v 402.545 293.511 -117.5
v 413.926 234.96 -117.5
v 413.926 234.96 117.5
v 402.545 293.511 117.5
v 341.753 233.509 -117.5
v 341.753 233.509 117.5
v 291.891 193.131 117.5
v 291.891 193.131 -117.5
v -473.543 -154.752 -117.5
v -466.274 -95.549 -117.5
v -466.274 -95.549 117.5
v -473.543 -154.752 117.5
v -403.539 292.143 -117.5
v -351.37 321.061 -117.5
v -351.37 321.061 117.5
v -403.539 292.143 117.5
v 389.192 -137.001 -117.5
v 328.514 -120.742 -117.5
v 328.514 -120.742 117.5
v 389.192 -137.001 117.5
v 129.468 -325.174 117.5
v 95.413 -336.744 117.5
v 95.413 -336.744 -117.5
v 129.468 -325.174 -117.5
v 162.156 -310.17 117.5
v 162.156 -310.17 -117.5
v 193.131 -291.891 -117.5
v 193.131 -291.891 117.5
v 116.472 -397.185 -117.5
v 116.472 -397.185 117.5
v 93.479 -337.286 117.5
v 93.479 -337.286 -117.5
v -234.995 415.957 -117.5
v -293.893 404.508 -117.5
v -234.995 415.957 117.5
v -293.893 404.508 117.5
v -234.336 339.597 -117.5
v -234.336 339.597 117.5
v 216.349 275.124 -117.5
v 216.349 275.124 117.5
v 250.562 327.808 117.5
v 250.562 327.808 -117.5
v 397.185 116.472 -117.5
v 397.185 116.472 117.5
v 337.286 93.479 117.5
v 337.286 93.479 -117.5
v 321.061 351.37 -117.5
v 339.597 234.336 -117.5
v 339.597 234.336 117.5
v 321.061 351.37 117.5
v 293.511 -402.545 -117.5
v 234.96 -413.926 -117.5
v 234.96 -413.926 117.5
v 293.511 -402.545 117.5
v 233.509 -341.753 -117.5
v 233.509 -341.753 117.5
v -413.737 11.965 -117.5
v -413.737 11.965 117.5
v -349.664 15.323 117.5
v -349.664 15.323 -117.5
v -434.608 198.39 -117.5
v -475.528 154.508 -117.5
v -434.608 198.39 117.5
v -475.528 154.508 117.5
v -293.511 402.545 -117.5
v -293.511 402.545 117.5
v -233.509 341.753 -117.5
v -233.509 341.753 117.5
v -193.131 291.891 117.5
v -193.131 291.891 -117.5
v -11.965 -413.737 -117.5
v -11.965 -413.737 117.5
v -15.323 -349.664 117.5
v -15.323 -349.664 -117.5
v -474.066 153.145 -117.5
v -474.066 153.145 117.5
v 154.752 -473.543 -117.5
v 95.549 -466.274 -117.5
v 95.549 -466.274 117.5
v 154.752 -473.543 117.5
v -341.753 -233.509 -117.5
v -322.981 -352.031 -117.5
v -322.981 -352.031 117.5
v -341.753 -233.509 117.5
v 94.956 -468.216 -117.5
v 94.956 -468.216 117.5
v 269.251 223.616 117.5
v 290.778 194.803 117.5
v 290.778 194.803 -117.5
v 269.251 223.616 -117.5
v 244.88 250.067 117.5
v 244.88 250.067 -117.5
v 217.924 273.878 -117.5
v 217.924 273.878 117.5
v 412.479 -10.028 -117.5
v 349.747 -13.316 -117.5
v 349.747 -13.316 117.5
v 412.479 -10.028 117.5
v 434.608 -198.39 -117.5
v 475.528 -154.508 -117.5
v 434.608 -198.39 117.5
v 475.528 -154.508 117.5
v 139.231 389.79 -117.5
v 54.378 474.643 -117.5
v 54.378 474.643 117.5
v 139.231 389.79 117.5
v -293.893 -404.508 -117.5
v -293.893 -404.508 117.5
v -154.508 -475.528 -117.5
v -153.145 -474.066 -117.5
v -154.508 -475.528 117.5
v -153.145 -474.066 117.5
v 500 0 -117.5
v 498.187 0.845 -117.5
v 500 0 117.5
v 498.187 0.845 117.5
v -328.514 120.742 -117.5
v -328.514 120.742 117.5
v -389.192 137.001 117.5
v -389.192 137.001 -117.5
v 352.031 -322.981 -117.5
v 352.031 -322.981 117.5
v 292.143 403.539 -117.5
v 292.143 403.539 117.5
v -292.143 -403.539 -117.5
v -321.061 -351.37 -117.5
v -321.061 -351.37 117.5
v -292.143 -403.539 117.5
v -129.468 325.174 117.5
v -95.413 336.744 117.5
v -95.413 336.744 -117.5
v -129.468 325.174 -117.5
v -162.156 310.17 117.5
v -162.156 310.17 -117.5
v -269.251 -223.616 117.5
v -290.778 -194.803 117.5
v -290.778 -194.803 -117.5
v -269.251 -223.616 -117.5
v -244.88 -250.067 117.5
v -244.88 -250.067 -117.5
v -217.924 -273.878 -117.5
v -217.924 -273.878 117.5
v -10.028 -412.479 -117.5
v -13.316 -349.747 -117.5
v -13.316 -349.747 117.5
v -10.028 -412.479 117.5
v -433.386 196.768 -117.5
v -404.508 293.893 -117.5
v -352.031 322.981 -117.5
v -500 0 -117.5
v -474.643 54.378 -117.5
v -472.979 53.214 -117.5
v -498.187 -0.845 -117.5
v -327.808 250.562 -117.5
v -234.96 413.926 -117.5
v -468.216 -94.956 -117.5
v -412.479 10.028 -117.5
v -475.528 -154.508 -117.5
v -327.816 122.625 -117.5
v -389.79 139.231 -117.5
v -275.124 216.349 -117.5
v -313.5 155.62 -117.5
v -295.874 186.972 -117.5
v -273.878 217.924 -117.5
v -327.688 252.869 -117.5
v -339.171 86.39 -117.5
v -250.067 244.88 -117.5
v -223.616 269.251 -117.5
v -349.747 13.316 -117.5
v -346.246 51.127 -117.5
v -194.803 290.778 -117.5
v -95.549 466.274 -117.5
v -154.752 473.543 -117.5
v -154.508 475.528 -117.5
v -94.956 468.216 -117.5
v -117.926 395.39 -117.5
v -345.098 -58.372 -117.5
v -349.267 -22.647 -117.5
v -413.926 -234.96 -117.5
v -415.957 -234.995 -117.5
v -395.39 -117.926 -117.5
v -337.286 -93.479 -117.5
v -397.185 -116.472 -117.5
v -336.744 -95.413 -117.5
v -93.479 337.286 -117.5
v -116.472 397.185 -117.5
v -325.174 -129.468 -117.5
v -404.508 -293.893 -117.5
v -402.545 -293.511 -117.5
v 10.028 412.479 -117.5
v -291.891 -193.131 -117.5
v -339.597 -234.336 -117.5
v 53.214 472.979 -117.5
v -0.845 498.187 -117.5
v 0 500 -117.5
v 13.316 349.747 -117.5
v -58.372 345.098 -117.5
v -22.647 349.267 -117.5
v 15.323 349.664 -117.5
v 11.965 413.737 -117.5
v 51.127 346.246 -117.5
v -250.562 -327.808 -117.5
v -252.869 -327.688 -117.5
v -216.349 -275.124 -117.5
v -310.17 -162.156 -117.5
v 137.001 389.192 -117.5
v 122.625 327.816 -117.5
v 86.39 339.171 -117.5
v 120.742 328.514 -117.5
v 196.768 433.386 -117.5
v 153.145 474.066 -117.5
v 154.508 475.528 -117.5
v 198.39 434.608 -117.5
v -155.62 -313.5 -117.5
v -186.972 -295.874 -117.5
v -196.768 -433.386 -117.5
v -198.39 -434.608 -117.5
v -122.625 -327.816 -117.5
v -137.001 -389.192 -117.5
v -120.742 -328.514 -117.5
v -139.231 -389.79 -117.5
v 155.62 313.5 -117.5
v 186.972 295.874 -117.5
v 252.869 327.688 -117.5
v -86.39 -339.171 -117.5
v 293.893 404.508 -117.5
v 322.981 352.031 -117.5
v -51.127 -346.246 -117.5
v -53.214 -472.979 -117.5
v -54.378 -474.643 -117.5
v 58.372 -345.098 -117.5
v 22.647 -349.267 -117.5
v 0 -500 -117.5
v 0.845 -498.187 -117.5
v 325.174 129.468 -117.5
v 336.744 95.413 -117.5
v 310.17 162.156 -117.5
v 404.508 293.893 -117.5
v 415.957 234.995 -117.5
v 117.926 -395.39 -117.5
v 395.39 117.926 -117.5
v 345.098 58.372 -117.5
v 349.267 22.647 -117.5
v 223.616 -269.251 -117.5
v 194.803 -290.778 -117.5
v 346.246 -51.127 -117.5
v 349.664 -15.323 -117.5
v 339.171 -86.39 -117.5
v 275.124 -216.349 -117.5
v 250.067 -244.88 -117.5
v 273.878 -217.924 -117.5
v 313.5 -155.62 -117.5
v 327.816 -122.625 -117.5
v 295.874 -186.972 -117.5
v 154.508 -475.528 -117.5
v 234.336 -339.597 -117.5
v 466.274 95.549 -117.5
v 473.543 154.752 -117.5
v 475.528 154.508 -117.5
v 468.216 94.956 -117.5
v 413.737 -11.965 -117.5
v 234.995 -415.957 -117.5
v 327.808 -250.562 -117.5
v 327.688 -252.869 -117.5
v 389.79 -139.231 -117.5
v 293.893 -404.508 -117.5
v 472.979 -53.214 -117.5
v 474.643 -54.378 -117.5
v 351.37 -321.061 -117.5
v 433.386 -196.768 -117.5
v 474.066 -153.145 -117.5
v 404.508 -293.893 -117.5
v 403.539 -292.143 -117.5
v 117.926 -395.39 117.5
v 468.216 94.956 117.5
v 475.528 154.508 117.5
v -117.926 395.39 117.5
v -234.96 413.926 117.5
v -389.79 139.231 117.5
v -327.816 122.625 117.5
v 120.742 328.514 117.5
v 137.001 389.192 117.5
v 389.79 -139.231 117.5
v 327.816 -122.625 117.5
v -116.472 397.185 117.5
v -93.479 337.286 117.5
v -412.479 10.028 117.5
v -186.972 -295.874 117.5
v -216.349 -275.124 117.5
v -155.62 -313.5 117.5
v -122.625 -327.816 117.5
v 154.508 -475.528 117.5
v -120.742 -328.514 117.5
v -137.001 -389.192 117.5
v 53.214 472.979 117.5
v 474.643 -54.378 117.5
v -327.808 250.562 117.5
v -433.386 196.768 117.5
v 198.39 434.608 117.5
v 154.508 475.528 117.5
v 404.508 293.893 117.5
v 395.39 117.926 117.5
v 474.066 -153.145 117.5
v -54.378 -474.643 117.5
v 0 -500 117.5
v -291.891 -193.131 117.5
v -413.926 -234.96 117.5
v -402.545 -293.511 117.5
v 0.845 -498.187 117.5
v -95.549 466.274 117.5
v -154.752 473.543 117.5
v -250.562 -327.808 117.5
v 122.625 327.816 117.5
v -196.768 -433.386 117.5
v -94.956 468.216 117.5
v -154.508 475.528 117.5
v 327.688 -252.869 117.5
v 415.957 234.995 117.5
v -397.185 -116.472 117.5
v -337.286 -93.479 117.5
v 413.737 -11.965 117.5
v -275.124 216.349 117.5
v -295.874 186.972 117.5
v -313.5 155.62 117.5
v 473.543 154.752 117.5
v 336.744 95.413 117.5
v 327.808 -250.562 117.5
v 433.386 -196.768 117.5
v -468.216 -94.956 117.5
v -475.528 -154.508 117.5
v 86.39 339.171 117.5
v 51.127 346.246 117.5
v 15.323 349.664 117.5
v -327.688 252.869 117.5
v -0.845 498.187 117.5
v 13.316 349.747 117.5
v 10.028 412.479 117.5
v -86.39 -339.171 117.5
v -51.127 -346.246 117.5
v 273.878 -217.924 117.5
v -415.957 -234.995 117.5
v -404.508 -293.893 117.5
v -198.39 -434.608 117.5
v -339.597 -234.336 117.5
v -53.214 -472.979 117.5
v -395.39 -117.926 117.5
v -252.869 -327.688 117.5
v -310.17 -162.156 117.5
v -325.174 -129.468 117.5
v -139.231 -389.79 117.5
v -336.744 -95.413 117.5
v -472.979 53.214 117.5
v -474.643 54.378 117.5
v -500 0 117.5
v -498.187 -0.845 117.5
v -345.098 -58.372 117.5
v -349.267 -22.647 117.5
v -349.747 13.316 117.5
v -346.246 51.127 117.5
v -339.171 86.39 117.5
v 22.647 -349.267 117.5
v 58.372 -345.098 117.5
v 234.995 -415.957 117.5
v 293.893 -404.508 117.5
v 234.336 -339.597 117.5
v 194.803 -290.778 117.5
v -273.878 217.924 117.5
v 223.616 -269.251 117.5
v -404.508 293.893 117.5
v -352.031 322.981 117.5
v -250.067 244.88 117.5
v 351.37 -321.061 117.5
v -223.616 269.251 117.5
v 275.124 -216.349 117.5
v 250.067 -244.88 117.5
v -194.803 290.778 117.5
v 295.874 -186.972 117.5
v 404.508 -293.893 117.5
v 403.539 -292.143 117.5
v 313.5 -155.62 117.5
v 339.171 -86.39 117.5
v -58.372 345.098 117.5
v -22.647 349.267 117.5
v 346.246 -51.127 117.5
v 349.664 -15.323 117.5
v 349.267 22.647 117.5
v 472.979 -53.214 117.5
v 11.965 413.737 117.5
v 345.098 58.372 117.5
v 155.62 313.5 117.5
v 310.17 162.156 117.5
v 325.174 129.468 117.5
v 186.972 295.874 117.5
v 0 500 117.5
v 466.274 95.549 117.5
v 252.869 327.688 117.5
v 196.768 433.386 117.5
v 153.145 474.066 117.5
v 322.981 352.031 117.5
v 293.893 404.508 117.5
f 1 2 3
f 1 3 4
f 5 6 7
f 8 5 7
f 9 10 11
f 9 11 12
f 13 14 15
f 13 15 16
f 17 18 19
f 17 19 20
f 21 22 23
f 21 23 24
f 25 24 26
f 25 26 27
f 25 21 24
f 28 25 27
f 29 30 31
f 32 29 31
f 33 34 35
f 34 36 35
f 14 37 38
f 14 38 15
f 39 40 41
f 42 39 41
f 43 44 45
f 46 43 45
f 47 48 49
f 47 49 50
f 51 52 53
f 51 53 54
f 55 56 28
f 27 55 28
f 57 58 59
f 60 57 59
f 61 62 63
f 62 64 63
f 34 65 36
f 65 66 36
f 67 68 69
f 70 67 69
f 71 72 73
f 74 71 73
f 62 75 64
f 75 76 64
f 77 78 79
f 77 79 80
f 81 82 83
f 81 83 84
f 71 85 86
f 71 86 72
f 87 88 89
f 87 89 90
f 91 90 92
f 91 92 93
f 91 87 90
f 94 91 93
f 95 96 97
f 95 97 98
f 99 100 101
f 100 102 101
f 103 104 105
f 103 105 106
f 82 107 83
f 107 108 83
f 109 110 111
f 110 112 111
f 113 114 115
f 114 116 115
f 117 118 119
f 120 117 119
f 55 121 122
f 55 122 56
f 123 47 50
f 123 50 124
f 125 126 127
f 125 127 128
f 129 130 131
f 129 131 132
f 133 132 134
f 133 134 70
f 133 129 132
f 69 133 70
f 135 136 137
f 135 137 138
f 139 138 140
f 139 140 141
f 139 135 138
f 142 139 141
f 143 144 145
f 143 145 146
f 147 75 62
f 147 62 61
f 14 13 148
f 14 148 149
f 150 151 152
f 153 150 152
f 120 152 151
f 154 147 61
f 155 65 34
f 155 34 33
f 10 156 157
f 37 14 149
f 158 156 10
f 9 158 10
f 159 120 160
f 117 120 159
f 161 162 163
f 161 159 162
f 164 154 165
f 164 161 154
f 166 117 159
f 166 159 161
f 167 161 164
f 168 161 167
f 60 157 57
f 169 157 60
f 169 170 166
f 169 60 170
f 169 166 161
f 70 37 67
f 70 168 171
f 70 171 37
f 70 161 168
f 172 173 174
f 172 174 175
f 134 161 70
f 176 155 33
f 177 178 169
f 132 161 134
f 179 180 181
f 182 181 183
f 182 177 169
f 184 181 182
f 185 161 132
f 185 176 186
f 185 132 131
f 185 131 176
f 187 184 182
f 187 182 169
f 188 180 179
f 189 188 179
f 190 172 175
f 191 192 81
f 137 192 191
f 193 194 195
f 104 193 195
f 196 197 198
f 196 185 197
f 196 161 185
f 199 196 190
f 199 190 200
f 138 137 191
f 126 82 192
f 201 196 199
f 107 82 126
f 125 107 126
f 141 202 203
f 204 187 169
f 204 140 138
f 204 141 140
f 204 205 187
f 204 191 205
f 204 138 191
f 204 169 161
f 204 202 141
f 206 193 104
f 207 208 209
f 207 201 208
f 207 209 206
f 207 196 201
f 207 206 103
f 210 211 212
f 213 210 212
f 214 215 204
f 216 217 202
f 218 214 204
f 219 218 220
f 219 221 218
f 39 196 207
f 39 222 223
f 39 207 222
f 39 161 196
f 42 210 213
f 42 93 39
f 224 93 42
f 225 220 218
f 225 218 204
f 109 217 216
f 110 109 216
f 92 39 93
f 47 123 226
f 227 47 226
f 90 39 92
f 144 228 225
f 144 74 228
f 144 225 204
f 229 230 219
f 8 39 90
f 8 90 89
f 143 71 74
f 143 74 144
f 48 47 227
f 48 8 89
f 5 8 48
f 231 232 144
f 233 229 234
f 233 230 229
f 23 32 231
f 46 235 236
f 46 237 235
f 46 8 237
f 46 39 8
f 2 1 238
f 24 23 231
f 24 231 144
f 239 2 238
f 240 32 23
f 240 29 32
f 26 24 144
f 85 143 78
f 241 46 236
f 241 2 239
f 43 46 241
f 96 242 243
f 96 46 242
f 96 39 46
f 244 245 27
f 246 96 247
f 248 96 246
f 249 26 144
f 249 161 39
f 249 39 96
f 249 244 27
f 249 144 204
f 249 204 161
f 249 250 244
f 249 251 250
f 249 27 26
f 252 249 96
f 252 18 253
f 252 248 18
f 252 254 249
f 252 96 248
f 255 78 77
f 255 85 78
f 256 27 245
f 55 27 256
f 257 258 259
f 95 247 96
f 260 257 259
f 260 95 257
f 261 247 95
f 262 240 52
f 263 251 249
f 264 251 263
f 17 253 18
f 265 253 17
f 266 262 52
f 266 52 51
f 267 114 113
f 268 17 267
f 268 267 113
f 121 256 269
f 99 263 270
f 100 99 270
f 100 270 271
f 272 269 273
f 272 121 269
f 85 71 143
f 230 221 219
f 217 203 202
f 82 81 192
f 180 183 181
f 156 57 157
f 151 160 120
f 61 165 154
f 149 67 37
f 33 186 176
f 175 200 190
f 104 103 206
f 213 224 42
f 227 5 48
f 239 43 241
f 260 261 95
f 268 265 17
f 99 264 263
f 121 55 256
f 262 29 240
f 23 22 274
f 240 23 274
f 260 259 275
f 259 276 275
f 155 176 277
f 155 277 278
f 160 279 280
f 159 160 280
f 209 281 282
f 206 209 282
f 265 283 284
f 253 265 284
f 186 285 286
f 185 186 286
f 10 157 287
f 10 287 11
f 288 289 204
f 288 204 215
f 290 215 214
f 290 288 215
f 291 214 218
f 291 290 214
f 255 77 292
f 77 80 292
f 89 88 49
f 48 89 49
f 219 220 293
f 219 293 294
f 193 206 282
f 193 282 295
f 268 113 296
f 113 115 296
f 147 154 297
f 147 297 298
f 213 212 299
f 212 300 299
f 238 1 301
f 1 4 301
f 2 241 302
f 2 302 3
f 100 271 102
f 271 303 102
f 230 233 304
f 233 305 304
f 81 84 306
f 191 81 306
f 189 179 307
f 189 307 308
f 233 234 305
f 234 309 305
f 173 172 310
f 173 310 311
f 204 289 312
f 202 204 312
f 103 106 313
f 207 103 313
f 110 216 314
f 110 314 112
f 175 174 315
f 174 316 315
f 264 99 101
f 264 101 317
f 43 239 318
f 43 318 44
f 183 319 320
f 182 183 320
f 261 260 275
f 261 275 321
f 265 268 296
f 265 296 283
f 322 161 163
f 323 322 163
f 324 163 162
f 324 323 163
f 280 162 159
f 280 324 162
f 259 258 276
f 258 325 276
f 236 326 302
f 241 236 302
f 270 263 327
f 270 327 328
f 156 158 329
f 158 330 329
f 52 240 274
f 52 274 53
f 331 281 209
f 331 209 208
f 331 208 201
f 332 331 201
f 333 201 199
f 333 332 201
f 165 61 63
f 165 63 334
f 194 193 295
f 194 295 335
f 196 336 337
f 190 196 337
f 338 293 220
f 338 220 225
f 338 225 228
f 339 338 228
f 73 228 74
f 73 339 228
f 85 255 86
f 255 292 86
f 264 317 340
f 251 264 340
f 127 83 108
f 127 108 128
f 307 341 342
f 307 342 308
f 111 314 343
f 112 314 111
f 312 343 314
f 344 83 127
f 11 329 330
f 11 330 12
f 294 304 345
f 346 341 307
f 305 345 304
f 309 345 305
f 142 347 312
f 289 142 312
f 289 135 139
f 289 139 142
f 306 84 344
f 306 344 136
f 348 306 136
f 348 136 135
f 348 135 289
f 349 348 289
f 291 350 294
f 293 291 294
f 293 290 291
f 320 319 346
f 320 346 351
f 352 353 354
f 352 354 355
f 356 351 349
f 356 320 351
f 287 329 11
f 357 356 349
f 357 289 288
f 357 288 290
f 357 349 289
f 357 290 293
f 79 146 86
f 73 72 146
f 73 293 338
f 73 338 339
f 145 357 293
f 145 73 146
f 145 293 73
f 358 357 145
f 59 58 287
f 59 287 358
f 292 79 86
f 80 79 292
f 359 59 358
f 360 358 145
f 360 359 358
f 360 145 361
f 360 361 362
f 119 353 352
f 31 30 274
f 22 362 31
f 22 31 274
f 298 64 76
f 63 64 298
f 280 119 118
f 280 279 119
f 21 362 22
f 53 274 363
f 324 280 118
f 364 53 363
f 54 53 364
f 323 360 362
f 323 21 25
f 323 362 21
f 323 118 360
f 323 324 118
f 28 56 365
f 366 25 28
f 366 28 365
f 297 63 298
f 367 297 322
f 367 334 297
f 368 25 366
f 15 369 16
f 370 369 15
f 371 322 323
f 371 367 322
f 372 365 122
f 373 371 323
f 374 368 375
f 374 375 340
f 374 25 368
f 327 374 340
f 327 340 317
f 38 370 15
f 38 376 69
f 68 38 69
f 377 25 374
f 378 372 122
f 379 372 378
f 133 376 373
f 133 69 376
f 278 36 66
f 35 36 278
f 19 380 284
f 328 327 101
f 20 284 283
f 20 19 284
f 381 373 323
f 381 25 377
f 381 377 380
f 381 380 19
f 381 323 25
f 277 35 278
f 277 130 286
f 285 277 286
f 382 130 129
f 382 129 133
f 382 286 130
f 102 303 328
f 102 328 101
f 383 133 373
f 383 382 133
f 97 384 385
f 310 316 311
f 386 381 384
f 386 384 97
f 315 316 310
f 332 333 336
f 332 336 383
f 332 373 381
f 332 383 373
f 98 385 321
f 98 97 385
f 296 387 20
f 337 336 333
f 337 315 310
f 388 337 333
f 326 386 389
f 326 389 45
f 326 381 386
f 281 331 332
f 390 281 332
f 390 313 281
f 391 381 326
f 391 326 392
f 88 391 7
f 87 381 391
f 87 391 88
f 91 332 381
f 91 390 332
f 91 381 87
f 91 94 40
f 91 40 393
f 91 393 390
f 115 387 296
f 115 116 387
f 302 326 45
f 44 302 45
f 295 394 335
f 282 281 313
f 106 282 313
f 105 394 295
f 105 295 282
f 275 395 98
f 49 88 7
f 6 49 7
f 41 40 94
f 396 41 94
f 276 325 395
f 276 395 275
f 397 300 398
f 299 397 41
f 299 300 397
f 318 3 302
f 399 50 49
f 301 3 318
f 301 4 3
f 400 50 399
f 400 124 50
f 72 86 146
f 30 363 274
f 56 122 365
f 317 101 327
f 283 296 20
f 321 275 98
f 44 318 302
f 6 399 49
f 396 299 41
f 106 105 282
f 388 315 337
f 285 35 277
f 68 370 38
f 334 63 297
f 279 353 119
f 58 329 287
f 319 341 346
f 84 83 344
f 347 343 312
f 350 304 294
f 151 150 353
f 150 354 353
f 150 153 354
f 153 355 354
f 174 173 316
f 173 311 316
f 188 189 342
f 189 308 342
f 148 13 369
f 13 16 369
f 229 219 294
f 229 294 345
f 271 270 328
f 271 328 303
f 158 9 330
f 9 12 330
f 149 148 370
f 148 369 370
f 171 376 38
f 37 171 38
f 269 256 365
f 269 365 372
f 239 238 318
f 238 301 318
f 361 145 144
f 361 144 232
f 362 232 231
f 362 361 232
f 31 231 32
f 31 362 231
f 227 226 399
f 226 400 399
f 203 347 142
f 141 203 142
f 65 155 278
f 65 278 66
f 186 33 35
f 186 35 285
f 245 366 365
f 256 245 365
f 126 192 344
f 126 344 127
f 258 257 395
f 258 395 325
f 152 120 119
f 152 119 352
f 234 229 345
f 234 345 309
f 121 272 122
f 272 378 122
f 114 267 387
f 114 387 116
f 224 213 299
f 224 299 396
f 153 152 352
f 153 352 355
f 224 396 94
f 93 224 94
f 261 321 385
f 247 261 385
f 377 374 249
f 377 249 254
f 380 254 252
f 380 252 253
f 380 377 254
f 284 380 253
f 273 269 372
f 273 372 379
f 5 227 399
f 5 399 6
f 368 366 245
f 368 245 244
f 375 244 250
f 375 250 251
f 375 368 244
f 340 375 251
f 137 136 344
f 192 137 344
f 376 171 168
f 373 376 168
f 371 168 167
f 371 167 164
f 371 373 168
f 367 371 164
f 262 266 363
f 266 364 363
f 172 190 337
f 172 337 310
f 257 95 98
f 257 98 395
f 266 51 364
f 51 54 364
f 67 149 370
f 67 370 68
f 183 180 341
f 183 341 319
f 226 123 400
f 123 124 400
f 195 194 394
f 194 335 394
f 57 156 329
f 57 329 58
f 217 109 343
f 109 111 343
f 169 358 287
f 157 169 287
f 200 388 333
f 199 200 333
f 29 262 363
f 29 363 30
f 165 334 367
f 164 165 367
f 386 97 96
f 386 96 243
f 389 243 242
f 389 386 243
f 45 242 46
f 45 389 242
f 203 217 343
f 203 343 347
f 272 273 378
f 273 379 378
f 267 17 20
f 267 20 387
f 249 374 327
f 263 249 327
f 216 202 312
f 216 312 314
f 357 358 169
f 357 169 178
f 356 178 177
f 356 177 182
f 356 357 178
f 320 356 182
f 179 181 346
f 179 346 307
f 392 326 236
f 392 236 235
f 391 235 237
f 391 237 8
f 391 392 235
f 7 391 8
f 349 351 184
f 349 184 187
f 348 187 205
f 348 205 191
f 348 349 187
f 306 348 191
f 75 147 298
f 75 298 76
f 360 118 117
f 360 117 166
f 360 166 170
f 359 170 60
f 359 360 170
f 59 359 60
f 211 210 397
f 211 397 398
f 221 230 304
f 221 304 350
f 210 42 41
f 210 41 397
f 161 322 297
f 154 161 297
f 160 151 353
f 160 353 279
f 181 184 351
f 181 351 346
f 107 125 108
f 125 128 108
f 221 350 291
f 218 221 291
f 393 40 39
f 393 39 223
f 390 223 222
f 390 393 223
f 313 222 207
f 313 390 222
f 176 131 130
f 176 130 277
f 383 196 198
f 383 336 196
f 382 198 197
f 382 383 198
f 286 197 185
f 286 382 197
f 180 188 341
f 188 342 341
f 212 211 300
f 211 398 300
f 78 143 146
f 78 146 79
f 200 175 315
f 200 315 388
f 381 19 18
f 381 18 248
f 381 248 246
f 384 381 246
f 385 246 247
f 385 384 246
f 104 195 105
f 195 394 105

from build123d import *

# Parameters (mm, degrees)
RADDURCHMESSER_R                = 350
AUFSATZ_LINEAR_AUSTRAGEN1_DEPTH = 117.5
AUFSATZ_LINEAR_AUSTRAGEN2_DEPTH = 117.5
KREISMUSTER1_COUNT              = 20


with BuildPart() as part:
    # Raddurchmesser → Aufsatz-Linear austragen1 (new body, symmetric)
    with BuildSketch(Plane.XY):
        Circle(RADDURCHMESSER_R)
    extrude(amount=AUFSATZ_LINEAR_AUSTRAGEN1_DEPTH, both=True)

    # Schaufelschnitt → Aufsatz-Linear austragen2 (add, symmetric)
    with BuildSketch(Plane.XY):
        Polygon((122.625257529, 327.815567379), (120.693405876, 328.333205469), (137.000570821, 389.192373572), (53.213617667, 472.979326726), (-0.845236523, 498.187384426), (0, 500), (54.378467222, 474.642904296), (139.231280965, 389.790090553), align=None)
    aufsatz_linear_austragen2 = extrude(amount=AUFSATZ_LINEAR_AUSTRAGEN2_DEPTH, both=True)

    # Kreismuster1: Aufsatz-Linear austragen2 ×20 about axis
    kreismuster1_axis = Axis((0, 0, 0), (0, 0, 1))
    for i in range(1, KREISMUSTER1_COUNT):
        add(aufsatz_linear_austragen2.rotate(kreismuster1_axis, i * 360 / KREISMUSTER1_COUNT))


solid = part.part
